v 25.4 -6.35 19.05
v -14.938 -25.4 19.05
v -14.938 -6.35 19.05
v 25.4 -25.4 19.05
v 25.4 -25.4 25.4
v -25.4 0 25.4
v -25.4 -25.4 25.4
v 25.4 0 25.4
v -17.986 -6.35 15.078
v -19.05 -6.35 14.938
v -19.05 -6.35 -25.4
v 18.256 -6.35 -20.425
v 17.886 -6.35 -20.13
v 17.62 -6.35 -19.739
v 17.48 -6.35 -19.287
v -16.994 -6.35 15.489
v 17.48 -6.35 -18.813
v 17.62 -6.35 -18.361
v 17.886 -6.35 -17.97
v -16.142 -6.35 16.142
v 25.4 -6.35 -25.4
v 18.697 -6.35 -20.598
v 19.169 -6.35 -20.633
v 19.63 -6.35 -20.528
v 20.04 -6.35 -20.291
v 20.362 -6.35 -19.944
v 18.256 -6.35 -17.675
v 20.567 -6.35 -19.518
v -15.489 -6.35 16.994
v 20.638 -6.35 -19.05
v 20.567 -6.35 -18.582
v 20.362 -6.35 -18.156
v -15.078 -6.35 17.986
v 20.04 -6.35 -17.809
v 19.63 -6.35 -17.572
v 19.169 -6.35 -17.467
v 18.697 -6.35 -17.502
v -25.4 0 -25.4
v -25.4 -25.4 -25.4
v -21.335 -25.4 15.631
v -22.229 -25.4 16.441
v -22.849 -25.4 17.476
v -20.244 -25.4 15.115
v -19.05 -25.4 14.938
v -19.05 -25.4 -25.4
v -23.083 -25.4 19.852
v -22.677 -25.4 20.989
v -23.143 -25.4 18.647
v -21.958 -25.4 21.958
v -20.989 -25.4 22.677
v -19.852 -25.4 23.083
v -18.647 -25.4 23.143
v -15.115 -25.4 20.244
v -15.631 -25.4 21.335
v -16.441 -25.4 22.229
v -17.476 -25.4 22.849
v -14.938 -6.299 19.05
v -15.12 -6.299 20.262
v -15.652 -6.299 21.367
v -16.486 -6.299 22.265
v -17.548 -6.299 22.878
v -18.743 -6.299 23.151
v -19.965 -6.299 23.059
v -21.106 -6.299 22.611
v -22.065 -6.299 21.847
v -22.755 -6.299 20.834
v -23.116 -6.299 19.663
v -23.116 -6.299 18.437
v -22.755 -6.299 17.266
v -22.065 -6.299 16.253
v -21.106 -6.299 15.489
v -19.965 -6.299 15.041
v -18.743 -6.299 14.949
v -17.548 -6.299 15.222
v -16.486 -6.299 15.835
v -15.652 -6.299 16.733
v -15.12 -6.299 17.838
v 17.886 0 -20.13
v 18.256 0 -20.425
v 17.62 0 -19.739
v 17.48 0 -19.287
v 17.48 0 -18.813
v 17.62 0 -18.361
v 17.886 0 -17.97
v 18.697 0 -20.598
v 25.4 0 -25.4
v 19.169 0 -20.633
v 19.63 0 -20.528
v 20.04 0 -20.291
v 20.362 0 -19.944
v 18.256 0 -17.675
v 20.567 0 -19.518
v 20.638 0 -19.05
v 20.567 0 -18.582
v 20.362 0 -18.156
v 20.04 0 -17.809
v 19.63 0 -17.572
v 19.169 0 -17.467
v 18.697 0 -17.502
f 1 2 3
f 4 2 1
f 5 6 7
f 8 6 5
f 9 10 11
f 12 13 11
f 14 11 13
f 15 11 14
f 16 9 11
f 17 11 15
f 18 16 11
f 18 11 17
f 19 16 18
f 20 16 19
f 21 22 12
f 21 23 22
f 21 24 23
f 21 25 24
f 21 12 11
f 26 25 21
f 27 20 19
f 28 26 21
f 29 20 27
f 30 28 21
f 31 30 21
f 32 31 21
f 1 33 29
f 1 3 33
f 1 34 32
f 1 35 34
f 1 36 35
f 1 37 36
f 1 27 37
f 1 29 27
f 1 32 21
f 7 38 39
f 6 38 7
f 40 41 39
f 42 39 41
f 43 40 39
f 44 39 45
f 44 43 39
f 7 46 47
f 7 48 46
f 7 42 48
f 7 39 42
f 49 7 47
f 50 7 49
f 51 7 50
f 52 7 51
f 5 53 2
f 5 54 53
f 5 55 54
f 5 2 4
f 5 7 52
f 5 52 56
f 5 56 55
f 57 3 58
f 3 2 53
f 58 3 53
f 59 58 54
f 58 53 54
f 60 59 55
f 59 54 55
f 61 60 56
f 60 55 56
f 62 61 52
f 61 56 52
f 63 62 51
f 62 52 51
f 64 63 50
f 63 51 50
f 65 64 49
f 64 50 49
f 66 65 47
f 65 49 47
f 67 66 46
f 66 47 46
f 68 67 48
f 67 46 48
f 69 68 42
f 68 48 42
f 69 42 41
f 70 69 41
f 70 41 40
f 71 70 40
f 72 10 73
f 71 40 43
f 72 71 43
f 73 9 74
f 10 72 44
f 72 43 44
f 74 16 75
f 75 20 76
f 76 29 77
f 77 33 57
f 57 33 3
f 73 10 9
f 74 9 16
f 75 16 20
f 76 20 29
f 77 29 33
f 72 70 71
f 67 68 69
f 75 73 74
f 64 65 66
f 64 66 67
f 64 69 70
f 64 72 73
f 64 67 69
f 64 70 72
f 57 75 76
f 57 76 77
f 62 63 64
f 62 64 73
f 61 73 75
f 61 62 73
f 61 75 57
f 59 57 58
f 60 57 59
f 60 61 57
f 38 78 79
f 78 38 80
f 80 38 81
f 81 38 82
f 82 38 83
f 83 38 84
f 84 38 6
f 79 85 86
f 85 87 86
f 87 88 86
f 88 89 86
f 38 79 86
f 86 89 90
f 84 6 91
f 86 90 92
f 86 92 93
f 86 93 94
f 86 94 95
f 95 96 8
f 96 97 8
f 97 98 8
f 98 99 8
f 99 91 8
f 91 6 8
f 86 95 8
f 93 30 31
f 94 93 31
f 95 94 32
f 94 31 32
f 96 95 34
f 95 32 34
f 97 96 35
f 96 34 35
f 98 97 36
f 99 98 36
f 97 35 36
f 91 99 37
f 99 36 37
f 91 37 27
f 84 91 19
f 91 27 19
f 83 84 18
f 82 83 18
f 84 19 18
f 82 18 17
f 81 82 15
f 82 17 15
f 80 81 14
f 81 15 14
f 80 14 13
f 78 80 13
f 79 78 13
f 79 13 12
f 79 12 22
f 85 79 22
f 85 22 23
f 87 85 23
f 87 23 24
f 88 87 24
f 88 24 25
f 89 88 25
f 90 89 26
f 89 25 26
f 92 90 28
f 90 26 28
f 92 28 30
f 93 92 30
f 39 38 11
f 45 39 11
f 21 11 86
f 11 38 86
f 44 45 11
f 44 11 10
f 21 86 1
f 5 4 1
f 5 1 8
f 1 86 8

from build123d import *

# Parameters (mm, degrees)
F0_W     = 50.8
F0_H     = 50.8
F1_DEPTH = 25.4
F2_W     = 44.45
F2_H     = 44.45
F3_DEPTH = 19.05
F5_R     = 4.11241
F6_DEPTH = 19.1008
F4_R     = 1.5875
F7_DEPTH = 6.35


with BuildPart() as f1:
    # F0 (on Front) → F1 (new body)
    with BuildSketch(Plane.XZ):
        Rectangle(F0_W, F0_H)
    extrude(amount=F1_DEPTH)

    # F2 (on face) → F3 (cut)
    with BuildSketch(Plane.XZ.offset(25.4)):
        with Locations((3.175, -3.175)):
            Rectangle(F2_W, F2_H)
    extrude(amount=-F3_DEPTH, mode=Mode.SUBTRACT)

    # F5 (on face) → F6 (cut)
    with BuildSketch(Plane.XZ.offset(25.4)):
        with Locations((-19.05, 19.05)):
            Circle(F5_R)
    extrude(amount=-F6_DEPTH, mode=Mode.SUBTRACT)

    # F4 (on face) → F7 (cut)
    with BuildSketch(Plane.XZ.offset(6.35)):
        with Locations((19.05, -19.05)):
            Circle(F4_R)
    extrude(amount=-F7_DEPTH, mode=Mode.SUBTRACT)


solid = f1.part
